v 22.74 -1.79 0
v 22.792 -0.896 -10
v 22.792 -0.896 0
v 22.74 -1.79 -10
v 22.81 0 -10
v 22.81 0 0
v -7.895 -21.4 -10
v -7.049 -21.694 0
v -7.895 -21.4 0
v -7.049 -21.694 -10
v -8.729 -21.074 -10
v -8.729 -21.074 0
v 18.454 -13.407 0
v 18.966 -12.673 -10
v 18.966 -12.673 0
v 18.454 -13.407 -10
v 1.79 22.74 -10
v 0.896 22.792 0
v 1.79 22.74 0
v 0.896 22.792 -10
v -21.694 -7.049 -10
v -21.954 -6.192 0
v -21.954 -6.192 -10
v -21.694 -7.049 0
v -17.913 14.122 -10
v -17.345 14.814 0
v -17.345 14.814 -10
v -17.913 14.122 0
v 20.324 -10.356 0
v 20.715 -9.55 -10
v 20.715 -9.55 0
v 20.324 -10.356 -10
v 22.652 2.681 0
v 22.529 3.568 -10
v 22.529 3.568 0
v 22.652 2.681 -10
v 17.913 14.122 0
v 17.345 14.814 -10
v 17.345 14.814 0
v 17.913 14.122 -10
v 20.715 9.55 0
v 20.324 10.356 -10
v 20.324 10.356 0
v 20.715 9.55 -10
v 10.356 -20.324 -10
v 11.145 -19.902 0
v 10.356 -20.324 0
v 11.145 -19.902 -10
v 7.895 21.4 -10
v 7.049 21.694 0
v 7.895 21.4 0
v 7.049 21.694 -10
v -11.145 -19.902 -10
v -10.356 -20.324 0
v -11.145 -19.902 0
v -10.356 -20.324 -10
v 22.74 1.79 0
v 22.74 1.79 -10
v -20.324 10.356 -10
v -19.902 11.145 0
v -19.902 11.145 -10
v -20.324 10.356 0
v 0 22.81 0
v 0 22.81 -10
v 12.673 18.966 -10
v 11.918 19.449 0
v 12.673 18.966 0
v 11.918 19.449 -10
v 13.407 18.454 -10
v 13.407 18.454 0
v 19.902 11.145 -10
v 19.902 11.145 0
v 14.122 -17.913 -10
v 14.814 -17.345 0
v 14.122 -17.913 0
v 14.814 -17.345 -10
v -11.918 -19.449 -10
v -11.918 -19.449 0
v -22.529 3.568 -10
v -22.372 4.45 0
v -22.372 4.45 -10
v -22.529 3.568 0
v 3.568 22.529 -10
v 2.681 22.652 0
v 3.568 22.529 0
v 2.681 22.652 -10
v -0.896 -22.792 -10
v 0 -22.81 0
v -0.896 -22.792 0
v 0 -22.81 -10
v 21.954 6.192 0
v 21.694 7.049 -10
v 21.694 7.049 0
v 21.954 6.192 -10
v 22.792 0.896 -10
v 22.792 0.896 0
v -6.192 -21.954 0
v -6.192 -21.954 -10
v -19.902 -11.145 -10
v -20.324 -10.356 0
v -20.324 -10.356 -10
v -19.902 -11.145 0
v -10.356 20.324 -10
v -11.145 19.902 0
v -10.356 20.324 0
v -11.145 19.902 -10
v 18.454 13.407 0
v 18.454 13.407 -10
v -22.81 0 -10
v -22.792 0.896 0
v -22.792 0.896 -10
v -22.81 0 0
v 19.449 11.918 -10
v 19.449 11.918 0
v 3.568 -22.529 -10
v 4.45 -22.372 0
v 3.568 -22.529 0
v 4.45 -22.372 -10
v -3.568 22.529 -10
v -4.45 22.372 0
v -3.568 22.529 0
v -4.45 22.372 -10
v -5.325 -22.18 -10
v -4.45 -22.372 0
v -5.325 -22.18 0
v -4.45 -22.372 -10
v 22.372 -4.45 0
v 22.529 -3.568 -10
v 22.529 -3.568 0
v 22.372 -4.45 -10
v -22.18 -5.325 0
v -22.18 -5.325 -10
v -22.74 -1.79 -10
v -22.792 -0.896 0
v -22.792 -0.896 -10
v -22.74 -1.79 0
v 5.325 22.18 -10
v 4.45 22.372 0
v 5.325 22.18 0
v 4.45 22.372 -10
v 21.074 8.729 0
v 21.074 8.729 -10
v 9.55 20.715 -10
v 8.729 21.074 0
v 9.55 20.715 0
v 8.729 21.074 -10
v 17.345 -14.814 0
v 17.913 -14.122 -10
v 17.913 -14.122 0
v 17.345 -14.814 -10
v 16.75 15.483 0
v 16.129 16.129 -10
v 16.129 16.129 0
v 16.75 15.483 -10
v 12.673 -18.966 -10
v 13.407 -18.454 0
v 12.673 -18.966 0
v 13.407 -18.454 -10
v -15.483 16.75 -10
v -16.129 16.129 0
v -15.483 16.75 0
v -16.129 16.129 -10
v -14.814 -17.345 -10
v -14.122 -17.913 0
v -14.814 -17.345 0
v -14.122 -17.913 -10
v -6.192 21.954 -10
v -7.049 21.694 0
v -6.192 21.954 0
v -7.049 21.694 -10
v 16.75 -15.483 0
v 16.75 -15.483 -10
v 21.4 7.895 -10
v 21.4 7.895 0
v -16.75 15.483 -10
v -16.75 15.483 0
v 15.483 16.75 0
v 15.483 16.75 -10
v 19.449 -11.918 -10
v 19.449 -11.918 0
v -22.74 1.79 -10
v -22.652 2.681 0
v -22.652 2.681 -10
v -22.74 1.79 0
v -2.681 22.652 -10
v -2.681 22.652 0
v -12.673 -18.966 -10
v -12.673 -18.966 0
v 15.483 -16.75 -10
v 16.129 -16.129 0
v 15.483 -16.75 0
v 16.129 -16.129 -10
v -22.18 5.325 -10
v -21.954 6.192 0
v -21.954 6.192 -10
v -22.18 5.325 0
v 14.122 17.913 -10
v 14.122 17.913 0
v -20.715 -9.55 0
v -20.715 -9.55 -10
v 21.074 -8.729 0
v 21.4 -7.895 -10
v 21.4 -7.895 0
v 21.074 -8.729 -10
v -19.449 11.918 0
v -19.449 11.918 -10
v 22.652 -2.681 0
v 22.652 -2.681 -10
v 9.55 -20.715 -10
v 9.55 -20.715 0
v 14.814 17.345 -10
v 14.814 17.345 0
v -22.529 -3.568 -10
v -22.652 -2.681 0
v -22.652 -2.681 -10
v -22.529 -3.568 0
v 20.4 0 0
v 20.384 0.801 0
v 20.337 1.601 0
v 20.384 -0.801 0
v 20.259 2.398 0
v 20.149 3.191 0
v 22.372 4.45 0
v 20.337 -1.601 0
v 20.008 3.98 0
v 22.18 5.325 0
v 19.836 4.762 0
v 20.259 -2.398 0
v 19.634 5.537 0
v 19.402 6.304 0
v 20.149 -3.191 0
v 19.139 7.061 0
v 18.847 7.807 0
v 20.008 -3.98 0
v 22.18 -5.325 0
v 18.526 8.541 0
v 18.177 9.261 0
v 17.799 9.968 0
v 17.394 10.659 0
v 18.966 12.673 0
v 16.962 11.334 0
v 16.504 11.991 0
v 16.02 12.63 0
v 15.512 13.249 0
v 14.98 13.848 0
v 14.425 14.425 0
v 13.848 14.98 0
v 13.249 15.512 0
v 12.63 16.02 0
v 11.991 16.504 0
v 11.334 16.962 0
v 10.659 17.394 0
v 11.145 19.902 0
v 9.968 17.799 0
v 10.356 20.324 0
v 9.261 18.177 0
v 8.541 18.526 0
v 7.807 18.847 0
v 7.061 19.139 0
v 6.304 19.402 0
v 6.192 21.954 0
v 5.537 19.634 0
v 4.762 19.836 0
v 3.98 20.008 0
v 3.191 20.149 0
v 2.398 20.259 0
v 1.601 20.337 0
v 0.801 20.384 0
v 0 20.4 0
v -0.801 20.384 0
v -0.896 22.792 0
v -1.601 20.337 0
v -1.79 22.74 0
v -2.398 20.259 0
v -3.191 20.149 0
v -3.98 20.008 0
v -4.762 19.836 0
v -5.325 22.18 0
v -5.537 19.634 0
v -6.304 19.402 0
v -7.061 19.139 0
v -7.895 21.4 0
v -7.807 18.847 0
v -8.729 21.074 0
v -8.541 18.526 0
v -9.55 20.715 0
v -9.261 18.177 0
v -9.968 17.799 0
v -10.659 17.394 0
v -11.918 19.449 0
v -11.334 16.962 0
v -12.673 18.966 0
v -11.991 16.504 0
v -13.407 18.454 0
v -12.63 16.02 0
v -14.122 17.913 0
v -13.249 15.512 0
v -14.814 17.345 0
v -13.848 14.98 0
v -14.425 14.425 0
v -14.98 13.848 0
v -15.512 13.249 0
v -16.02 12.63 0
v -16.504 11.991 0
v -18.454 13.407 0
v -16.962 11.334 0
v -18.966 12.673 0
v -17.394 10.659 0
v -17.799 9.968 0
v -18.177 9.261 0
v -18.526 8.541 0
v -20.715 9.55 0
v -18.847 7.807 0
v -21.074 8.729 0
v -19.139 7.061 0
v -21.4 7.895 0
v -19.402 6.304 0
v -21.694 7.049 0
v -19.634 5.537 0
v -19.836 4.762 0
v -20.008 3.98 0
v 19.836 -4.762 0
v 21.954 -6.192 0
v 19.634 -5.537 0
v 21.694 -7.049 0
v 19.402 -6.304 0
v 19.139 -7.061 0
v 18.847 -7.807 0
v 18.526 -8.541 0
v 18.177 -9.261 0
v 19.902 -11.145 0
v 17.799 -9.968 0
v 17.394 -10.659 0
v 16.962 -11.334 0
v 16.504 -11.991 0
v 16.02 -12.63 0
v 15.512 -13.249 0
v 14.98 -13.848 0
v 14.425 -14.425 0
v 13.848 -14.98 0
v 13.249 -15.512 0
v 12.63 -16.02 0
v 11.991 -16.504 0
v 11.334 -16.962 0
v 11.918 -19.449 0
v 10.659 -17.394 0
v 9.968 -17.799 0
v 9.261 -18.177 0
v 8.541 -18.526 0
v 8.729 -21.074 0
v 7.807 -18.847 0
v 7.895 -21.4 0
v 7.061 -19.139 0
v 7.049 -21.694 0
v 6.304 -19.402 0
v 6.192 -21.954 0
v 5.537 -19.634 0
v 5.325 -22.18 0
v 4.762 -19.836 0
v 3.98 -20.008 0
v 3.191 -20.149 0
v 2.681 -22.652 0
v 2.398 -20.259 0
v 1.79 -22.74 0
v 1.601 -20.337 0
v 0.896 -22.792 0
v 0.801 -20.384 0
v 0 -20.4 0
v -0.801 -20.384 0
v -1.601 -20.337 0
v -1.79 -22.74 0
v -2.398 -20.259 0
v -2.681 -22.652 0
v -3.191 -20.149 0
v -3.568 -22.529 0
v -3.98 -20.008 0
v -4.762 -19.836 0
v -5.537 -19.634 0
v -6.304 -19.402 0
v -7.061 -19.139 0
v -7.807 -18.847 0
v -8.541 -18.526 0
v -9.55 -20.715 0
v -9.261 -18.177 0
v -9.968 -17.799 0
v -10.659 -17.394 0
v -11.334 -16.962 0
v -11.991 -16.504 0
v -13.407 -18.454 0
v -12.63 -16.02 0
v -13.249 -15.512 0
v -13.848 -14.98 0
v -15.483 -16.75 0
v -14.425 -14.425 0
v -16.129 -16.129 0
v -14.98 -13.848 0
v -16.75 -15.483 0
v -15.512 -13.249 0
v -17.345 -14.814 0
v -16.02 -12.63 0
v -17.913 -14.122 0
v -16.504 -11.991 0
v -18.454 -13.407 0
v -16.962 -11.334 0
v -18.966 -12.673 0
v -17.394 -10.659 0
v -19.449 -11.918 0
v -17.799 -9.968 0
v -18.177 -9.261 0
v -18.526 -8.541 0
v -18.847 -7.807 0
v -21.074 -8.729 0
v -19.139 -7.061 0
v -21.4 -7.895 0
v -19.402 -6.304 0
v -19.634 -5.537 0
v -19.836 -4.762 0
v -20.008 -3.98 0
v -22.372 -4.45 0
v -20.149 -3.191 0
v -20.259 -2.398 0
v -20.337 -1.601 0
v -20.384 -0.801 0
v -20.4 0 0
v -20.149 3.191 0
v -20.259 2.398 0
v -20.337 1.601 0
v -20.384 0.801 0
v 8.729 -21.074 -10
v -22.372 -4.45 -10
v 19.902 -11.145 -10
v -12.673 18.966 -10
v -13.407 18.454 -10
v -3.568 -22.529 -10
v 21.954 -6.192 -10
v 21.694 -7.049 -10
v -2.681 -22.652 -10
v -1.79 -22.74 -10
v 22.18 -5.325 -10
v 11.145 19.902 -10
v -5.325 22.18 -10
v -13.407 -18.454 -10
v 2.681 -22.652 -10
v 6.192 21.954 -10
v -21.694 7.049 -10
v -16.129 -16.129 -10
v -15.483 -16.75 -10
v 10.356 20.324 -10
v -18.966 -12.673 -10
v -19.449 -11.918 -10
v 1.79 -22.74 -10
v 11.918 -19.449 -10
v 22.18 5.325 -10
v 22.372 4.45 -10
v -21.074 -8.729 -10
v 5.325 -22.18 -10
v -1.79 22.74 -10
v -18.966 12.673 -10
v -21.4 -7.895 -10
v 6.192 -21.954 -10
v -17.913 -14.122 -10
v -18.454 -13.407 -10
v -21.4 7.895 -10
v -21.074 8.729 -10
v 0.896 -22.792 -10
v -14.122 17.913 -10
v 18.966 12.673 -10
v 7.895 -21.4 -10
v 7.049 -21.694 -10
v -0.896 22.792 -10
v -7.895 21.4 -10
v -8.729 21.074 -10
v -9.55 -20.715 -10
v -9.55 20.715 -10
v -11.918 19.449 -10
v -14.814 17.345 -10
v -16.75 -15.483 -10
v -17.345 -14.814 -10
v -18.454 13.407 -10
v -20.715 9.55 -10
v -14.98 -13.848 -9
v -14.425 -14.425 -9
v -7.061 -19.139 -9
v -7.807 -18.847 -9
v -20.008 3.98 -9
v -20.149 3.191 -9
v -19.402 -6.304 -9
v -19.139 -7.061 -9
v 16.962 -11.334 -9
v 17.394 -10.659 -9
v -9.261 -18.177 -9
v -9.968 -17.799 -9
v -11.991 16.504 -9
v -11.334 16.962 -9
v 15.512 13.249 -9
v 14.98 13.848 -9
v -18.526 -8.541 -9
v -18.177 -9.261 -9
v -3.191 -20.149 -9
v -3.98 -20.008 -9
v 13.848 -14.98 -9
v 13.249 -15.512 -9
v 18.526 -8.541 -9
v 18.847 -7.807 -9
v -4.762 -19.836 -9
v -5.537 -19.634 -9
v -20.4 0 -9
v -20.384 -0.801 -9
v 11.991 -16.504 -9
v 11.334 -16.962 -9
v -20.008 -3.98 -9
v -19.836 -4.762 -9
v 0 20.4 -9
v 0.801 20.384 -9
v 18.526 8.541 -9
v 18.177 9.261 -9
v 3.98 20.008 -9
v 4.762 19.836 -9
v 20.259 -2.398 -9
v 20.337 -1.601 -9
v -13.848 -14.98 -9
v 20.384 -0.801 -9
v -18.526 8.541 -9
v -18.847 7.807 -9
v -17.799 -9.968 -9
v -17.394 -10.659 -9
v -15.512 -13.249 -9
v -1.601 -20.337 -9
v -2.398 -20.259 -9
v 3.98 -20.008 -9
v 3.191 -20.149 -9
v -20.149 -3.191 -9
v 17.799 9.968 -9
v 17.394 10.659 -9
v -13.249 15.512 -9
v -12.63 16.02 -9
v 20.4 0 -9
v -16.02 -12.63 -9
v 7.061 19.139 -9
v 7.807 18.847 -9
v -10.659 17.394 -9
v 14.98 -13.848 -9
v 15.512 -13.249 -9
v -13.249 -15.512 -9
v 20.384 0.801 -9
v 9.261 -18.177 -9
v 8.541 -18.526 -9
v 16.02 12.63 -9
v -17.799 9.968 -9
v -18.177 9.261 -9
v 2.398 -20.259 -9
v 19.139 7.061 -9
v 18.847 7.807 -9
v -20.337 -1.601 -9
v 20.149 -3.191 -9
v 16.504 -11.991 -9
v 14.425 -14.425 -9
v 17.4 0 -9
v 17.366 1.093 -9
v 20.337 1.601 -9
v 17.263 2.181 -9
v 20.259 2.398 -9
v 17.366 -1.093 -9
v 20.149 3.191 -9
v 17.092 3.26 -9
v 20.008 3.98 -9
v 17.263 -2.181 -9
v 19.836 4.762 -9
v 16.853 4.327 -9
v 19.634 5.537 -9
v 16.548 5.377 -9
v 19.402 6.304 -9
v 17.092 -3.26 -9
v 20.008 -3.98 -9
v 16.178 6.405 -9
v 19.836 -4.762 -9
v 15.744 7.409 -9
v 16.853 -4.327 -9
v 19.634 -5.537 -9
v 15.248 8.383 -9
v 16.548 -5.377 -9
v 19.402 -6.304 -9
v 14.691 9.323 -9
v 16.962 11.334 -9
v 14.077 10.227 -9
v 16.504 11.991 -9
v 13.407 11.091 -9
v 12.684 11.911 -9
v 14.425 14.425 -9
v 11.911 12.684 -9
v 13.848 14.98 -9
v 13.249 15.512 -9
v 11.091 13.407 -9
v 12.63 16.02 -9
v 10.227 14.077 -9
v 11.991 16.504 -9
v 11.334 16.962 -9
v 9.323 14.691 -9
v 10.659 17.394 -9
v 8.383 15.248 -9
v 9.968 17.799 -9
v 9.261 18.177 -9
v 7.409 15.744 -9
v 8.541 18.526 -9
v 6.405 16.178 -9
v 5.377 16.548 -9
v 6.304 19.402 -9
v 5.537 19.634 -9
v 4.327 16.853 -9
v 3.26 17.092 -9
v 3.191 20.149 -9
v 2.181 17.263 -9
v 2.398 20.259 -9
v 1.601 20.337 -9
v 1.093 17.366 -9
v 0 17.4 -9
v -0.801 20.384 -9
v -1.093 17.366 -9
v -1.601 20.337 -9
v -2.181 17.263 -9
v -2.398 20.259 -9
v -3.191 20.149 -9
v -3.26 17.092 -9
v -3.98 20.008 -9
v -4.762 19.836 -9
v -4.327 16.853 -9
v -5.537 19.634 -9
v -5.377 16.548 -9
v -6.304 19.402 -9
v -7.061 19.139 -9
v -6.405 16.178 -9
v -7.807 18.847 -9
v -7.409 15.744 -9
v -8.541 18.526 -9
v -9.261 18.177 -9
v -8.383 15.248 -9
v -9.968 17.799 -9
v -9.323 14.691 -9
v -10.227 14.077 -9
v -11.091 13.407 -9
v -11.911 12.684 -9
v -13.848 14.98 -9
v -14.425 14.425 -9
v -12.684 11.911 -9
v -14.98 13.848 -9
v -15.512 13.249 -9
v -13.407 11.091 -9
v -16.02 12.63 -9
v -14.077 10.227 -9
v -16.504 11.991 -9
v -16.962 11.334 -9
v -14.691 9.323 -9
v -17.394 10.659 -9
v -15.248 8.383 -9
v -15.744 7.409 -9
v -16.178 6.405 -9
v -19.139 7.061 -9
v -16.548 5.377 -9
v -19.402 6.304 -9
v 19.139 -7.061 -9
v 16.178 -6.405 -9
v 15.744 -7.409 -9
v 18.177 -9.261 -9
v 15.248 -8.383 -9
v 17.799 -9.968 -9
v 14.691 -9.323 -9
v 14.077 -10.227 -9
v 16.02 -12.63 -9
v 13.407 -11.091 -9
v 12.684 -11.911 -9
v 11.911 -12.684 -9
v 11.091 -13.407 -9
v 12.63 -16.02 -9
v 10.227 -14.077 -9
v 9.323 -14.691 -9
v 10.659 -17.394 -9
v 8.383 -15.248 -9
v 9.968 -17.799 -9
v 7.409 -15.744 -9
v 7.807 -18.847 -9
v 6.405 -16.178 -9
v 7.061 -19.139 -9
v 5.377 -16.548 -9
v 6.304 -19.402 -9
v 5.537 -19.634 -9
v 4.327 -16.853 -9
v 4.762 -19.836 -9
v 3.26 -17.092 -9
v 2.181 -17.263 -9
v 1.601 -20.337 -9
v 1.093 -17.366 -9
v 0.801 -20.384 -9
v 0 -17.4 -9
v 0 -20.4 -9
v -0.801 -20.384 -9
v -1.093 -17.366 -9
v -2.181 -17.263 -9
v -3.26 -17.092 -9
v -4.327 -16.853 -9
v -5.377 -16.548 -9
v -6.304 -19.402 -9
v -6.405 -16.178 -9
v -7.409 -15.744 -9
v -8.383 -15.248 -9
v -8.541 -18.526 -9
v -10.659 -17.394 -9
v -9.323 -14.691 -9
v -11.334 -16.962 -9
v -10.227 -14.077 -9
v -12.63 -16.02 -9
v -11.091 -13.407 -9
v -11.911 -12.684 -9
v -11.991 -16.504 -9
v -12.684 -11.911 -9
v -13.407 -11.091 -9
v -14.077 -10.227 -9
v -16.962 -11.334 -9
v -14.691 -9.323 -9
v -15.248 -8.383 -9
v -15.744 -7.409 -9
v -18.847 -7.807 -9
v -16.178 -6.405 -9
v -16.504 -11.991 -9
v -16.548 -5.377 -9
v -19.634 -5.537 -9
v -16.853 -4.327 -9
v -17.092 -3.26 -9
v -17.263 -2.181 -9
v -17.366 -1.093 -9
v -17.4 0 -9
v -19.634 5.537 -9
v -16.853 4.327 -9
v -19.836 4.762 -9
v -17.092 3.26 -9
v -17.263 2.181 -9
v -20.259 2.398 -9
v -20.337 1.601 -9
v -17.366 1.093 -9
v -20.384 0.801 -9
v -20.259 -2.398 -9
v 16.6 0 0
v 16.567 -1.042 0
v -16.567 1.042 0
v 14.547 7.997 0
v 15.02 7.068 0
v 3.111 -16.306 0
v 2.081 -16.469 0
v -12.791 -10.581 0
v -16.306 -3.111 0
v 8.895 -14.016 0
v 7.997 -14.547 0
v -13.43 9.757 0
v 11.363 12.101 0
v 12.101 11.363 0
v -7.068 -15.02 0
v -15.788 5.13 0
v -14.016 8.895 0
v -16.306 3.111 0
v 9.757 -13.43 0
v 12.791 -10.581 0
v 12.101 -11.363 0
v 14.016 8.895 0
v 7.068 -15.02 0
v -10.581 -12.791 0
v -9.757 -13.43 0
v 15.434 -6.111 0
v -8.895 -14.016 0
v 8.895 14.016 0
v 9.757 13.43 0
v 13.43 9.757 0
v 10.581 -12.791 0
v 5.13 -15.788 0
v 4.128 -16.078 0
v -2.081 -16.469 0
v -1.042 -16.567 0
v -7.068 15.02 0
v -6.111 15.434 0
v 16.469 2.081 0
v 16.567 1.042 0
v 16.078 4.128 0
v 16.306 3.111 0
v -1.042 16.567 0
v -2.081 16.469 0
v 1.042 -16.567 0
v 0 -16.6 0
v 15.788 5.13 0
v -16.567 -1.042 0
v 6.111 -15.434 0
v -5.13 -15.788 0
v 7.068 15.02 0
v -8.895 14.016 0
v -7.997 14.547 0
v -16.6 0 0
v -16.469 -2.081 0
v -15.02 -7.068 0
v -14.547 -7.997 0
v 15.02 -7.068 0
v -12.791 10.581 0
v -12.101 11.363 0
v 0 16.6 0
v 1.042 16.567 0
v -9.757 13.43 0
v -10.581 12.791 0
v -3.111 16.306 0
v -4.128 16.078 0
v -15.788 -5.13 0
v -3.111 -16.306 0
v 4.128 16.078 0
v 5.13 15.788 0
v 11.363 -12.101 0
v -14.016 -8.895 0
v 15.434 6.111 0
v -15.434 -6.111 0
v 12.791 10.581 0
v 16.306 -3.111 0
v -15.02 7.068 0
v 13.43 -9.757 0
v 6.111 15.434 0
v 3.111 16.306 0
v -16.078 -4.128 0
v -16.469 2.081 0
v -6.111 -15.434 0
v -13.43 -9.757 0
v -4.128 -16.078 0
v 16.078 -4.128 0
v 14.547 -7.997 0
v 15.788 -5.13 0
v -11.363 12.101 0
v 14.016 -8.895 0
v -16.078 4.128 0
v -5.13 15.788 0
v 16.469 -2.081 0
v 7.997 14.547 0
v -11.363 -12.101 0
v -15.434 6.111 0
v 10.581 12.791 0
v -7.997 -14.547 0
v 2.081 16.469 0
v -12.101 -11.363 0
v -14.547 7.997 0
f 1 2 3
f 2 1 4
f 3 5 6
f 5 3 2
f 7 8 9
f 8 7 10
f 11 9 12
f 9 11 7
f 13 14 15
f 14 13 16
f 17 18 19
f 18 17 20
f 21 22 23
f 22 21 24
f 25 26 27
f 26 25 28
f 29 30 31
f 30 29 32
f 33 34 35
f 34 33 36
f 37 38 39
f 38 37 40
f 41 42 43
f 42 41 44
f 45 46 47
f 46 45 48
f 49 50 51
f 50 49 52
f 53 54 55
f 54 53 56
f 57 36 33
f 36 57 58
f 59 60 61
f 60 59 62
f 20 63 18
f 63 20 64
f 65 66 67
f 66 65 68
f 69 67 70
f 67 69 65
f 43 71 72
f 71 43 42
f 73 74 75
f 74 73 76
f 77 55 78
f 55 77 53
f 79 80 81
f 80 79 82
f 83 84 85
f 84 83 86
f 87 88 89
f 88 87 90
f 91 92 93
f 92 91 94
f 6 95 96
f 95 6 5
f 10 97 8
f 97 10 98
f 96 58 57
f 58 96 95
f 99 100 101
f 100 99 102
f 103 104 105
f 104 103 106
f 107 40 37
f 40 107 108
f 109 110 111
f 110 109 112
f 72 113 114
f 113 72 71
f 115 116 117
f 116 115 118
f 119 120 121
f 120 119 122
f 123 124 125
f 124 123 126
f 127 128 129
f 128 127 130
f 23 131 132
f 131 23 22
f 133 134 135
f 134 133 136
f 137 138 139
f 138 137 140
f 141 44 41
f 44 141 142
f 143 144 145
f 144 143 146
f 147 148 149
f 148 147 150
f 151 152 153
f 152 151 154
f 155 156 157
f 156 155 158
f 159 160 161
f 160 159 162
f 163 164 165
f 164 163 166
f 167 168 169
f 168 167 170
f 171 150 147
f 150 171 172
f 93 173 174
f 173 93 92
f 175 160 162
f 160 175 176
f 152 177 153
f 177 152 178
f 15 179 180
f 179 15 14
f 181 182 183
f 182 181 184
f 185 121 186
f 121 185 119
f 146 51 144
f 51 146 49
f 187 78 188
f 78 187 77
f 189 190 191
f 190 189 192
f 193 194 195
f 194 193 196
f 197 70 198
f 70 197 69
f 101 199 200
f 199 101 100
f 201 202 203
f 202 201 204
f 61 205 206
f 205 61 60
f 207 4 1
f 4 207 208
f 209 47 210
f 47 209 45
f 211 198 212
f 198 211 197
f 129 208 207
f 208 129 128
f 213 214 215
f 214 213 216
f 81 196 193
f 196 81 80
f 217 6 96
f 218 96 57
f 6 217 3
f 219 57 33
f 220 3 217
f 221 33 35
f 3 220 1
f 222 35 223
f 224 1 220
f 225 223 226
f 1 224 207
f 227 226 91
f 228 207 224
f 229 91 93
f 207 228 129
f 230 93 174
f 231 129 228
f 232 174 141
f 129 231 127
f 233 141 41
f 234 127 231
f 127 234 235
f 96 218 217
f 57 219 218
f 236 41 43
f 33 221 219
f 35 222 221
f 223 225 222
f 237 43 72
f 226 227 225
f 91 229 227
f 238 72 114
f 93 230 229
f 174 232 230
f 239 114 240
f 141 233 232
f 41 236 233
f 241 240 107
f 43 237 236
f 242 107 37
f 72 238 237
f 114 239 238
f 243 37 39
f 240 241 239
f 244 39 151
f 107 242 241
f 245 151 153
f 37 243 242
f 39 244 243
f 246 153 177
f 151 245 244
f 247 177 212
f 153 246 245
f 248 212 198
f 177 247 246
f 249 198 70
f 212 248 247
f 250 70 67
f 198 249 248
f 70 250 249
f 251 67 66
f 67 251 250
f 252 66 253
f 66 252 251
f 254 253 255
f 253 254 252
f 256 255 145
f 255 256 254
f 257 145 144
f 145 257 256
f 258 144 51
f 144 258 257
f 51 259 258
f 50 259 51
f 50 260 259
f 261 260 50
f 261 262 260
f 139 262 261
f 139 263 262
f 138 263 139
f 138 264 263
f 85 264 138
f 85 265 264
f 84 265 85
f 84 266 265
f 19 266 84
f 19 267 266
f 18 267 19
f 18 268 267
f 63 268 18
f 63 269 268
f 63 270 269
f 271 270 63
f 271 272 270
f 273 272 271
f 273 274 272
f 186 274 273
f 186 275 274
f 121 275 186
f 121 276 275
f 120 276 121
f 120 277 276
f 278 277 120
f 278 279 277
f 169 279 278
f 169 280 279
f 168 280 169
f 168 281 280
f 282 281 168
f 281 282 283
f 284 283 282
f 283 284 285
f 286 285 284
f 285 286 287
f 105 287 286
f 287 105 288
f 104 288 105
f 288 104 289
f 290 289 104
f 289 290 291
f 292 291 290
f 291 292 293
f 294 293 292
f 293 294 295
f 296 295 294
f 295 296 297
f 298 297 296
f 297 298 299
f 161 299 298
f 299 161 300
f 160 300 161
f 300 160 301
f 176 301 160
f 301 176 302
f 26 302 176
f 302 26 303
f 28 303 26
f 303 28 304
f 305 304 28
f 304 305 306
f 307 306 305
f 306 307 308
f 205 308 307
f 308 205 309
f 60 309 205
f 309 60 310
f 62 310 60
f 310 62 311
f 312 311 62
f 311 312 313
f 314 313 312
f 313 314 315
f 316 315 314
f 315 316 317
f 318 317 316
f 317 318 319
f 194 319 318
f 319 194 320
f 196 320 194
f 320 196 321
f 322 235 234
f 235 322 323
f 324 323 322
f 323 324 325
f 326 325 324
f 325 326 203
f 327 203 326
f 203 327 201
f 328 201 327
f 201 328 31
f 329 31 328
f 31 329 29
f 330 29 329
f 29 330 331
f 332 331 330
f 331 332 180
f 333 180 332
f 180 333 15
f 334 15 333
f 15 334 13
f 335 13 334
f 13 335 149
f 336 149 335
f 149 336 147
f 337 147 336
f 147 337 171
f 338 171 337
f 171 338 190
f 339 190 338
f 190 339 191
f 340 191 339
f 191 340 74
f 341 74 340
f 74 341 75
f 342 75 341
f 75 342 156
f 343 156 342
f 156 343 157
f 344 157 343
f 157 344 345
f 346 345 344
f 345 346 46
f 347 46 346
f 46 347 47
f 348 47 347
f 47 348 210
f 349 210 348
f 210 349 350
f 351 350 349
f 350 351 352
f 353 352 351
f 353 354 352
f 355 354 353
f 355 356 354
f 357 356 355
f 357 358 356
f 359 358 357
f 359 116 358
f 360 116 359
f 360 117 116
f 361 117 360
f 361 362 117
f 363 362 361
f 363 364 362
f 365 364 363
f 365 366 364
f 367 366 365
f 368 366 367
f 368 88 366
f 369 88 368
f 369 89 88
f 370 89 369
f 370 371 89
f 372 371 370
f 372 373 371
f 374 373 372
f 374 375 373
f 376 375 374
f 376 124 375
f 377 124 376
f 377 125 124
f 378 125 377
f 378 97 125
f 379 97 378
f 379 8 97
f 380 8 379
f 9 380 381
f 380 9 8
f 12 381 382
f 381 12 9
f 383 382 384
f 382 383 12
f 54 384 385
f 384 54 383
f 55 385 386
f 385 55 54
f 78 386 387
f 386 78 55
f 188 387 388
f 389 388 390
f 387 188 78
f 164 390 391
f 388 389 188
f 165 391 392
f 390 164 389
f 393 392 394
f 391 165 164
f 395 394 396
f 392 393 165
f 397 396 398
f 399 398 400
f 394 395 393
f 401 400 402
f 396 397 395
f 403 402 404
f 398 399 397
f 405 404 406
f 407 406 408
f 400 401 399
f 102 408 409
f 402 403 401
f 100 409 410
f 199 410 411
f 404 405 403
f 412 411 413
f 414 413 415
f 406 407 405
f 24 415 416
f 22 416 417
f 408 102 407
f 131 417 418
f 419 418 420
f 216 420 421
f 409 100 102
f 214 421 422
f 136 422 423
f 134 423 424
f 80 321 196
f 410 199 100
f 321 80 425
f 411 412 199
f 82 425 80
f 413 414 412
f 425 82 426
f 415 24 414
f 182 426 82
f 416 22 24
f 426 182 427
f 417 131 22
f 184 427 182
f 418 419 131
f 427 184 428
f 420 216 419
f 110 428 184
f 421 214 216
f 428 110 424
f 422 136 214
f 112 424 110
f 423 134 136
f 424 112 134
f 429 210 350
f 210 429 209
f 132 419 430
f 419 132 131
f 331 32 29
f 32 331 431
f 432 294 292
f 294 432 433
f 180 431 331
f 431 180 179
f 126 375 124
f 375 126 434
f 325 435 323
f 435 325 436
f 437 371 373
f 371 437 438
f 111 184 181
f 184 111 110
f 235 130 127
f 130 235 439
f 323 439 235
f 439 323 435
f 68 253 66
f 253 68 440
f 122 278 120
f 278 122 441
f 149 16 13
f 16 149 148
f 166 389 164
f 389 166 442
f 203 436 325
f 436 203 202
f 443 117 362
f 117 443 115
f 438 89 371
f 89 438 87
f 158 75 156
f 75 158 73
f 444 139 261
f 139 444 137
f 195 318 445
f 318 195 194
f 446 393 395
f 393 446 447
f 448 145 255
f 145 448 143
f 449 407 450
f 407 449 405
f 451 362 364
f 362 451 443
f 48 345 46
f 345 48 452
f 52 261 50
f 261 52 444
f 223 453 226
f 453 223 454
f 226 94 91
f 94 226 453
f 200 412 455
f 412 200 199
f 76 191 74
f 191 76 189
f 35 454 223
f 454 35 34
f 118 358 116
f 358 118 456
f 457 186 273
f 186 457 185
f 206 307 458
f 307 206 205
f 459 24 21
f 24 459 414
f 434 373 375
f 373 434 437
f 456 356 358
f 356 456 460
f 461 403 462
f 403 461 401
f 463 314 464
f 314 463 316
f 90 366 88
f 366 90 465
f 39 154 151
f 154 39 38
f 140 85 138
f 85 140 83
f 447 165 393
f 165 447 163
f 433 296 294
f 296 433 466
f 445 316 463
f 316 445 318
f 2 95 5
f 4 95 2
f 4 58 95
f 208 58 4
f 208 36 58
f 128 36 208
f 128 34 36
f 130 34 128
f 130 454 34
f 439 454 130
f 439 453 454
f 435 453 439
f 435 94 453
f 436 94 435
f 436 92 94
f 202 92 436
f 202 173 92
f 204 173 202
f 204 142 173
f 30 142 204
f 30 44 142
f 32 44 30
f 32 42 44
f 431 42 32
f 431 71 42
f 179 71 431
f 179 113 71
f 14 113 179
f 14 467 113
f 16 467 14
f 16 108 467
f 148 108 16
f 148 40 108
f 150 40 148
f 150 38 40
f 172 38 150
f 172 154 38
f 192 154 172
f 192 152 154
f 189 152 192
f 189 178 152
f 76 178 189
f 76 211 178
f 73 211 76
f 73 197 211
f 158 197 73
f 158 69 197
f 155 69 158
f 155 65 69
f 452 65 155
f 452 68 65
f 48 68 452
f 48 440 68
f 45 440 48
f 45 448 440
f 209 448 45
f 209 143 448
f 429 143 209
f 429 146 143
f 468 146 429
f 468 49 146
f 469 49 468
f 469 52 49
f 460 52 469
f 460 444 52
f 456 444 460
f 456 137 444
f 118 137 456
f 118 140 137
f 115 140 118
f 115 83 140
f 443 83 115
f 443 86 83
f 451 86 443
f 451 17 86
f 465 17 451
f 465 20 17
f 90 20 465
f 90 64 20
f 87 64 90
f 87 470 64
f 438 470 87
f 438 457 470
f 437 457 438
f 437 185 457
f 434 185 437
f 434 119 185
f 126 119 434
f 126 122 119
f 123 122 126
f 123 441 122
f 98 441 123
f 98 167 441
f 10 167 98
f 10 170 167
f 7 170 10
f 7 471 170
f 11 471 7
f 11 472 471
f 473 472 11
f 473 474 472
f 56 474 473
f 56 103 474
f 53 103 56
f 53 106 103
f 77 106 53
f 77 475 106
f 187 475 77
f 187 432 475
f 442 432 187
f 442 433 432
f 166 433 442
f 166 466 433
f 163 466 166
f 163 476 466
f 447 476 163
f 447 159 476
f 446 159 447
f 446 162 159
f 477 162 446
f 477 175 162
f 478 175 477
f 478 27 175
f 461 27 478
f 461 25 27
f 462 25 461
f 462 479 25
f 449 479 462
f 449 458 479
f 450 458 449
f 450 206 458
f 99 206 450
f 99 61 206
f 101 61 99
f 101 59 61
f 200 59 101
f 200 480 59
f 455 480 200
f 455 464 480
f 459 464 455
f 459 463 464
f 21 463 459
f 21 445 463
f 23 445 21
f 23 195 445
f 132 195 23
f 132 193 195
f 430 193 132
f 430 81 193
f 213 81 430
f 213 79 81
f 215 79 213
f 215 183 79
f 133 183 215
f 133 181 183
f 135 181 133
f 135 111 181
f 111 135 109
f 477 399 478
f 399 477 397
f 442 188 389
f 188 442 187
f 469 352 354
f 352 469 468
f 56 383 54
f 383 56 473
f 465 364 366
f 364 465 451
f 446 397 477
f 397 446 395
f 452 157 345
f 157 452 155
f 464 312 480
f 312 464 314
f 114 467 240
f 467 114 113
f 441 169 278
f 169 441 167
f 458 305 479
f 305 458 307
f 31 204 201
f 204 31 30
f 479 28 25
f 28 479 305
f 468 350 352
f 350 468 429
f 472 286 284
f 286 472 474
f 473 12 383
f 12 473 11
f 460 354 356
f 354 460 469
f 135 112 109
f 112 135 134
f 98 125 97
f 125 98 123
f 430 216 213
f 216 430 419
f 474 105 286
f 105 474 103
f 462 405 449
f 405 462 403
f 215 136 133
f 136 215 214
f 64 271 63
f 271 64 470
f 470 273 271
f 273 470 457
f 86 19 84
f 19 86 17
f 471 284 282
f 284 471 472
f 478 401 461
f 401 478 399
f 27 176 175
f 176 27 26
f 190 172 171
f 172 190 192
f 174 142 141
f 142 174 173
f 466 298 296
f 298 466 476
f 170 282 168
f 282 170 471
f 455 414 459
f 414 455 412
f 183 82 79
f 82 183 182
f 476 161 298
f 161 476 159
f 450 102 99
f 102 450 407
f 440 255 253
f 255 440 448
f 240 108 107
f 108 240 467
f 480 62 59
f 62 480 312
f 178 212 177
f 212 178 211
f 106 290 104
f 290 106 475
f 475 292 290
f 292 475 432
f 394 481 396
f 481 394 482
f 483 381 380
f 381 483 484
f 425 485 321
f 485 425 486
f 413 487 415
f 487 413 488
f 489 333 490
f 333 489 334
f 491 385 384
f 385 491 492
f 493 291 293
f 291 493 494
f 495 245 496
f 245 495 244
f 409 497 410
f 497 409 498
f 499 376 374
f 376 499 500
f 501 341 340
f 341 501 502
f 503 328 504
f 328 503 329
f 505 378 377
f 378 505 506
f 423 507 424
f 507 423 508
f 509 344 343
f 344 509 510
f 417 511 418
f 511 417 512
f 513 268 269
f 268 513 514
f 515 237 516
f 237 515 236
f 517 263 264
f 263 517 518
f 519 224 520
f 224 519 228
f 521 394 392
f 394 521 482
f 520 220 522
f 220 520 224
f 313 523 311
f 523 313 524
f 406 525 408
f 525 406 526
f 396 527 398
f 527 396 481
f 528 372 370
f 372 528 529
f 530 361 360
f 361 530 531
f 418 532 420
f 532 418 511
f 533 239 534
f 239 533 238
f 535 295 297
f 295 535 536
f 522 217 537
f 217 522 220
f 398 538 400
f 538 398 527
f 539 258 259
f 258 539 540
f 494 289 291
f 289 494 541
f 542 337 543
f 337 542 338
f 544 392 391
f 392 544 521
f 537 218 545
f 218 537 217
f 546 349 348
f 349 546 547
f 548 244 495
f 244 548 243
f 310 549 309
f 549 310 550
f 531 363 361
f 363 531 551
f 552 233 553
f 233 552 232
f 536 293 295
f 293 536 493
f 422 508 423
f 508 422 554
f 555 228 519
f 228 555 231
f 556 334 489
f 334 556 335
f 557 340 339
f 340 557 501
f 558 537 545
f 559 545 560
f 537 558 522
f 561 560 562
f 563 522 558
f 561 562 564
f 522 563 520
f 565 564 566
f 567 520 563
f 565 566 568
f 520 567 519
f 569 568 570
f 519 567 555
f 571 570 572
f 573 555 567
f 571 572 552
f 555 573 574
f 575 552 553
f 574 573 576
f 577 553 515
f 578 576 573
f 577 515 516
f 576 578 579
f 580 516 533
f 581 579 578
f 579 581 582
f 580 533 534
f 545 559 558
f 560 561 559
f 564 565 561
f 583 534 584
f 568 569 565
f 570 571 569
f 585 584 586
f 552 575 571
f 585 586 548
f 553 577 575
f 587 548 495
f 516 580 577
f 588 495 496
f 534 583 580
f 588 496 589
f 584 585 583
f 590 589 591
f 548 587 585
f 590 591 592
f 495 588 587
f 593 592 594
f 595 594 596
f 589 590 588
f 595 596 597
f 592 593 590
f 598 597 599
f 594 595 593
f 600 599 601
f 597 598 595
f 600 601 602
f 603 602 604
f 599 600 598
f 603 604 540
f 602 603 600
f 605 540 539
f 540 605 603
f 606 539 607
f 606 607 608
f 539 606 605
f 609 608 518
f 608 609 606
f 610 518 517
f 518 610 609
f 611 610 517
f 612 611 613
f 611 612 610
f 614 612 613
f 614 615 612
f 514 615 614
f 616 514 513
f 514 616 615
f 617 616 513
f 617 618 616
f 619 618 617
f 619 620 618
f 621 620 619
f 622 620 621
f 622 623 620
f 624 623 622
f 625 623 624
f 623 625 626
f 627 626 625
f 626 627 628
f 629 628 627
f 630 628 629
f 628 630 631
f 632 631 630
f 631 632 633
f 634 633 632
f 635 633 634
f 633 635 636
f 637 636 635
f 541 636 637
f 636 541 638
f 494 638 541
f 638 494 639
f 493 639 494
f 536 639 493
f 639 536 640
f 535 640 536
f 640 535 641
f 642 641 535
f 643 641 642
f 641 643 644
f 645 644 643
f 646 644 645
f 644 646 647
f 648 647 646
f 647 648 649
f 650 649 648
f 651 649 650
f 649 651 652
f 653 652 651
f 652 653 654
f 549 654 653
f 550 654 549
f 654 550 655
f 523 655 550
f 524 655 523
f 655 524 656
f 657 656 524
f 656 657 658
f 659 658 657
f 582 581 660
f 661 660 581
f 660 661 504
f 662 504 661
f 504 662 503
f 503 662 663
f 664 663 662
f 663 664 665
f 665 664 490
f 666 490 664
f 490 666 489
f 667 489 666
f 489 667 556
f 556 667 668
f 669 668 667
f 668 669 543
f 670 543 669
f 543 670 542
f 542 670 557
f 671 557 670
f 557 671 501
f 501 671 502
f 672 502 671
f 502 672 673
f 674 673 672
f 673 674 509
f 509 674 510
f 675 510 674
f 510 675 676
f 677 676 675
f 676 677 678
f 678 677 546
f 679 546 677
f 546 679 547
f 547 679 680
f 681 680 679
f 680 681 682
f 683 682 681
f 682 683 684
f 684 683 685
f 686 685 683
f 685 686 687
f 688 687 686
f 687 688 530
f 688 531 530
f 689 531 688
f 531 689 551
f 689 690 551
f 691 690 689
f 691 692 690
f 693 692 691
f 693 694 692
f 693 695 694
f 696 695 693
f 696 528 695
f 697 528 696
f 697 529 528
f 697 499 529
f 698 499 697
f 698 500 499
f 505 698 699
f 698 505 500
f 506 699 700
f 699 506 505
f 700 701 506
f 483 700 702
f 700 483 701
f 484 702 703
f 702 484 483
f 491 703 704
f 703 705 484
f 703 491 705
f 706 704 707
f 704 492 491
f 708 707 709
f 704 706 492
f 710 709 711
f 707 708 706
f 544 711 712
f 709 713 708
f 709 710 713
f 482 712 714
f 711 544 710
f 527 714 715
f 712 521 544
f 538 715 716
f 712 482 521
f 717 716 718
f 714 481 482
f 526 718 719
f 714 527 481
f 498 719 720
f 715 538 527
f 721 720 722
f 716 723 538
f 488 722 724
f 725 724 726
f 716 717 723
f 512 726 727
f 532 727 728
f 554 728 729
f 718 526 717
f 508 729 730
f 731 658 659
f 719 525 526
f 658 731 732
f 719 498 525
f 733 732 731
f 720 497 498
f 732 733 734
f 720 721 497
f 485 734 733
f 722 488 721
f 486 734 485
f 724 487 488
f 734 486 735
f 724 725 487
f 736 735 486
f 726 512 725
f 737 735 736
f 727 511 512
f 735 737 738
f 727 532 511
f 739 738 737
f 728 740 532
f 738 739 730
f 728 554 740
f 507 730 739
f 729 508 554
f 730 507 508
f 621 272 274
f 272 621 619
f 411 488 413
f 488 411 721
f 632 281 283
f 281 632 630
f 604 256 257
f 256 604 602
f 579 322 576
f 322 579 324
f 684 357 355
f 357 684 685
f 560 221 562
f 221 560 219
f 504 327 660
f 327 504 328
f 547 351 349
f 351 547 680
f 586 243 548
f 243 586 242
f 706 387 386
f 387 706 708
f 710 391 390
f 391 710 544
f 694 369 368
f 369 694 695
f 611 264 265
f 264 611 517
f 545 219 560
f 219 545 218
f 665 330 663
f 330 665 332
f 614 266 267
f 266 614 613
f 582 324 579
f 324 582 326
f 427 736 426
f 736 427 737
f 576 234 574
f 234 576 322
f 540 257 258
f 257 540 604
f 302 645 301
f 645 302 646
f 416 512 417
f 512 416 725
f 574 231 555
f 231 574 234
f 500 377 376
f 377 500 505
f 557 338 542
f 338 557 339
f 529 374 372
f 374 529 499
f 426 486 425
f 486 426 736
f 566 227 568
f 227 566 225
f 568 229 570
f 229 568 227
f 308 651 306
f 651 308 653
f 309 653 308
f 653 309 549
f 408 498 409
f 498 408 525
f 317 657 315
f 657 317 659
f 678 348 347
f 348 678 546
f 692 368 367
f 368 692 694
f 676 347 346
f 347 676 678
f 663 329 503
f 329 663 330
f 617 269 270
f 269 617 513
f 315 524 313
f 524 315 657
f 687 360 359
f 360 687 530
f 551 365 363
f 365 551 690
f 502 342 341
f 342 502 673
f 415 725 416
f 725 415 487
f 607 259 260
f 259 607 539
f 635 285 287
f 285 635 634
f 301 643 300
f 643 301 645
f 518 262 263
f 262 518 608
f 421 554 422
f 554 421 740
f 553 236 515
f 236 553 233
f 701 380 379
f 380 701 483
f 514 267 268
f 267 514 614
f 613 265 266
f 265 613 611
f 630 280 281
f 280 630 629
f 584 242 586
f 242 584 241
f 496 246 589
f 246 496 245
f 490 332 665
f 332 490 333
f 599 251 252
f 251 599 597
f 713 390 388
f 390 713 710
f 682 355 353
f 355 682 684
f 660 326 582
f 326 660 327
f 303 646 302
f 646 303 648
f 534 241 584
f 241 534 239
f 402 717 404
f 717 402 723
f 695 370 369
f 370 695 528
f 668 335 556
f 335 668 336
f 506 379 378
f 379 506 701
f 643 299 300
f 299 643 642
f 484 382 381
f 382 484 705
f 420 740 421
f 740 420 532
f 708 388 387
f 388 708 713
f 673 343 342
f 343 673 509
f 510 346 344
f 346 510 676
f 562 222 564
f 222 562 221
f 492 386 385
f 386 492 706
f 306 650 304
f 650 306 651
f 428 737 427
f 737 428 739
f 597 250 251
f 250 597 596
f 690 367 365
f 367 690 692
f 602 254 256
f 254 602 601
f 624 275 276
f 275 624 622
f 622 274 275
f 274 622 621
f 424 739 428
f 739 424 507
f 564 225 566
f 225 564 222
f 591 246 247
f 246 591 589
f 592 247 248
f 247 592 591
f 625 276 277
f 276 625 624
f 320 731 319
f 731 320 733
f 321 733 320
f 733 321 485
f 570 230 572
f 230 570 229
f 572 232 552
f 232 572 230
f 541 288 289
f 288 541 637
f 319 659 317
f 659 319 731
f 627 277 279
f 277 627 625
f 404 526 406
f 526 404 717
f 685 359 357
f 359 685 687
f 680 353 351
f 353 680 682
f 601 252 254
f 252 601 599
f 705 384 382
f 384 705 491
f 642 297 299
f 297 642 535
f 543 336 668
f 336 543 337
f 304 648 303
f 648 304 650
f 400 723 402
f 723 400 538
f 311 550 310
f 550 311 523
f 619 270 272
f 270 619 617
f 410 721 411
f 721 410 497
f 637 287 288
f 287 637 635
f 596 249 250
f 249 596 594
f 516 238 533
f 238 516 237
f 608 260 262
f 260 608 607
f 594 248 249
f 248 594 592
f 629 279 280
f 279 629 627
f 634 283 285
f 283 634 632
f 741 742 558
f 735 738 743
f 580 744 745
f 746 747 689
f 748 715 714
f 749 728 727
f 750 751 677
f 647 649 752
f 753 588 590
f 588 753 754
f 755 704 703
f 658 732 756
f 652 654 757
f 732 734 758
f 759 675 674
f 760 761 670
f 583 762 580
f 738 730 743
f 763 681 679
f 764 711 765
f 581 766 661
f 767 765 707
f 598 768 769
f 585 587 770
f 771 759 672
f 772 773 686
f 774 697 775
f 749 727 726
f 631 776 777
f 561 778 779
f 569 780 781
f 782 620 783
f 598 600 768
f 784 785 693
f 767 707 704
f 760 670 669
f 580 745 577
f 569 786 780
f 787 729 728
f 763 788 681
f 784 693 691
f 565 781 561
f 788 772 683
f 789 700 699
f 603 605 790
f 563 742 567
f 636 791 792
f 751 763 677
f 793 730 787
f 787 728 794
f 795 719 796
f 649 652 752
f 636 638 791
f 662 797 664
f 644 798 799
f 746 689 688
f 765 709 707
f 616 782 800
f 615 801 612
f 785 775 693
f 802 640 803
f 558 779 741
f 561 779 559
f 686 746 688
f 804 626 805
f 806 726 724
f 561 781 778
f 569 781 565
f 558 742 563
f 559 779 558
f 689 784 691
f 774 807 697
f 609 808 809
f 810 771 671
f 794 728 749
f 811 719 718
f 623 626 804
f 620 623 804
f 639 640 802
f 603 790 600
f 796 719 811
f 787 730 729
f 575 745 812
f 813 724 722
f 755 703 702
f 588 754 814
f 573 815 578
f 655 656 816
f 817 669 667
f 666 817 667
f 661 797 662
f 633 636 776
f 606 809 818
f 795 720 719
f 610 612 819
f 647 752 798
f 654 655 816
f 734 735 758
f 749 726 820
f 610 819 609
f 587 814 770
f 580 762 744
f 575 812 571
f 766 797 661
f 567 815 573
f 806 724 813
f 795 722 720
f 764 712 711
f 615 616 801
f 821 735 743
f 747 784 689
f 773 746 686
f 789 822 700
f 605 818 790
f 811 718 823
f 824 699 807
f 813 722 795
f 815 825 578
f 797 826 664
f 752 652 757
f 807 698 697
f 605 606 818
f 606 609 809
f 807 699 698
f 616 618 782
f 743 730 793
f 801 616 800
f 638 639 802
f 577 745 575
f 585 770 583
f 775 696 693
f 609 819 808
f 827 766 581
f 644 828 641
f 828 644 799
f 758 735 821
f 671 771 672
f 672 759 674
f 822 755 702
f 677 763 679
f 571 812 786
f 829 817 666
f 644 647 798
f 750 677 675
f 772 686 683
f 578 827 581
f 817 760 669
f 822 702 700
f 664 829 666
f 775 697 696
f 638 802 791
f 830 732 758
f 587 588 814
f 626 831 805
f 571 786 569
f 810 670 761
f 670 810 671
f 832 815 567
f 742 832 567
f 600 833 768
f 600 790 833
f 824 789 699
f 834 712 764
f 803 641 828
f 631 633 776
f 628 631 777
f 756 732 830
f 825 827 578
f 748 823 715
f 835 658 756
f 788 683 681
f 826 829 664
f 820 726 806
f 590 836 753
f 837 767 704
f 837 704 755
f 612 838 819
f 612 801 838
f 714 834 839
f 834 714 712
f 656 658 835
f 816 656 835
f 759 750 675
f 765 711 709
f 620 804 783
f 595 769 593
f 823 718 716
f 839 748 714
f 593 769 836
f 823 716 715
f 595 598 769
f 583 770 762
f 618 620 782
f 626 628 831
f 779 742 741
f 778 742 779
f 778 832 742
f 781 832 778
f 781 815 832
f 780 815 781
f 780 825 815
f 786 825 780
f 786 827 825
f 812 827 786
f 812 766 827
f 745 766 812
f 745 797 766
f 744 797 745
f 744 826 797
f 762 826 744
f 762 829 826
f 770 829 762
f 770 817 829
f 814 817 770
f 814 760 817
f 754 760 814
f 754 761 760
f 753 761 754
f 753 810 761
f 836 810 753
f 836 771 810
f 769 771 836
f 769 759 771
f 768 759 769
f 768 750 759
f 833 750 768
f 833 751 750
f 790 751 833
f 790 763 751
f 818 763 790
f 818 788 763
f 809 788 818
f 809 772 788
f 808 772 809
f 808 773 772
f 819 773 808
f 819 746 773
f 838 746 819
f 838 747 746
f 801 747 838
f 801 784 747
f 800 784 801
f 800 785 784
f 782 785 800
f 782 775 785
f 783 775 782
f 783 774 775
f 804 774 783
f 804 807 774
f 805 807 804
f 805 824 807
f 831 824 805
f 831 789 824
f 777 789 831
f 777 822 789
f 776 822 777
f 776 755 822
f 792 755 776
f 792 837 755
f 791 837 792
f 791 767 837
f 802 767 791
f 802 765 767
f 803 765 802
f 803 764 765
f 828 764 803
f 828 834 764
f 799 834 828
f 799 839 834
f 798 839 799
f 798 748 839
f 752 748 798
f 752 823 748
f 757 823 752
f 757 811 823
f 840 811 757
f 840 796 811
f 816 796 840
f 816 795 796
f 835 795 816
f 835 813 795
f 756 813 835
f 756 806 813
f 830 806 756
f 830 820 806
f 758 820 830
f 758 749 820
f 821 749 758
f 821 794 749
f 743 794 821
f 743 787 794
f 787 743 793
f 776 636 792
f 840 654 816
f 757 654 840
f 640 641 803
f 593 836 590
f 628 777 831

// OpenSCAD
//Written by Remi Vansnickt
//Feel free to tip me : https://www.thingiverse.com/Remivans/about
//Thingiverse : https://www.thingiverse.com/thing:3149090
//Licensed under the Creative Commons - Attribution - Non-Commercial - Share Alike license.

/* [PVC TUBE] */
//( mm ) Outer diameter of pvc pipe
pvcOuterDiameter=40;//[8:0.5:200]

//( mm ) Inner diameter of pvc pipe
pvcInnerDiameter=34;//[4:0.5:190]

//( mm ) Clearance beetween part and outer pvc pipe
pvcpartClearance=0.4;//[0.1:0.05:1]

//Wall's number determine Thickness PrinterNozzleWidth*WallLayerCount 0.4*3=1.2mm
PvcWallLayerCount=6;  //[1:1:10]

//(mm) Thickness of bottom floor
floorWidth=1;//[1:01:10]

//( mm ) length mount on pvc tube
pvcLength=10;//[5:1:100]

/* [printerSetting] */
//( mm ) Width of the Nozzle
PrinterNozzleWidth=0.4; //[0.1:0.05:1]


pvcT=PvcWallLayerCount*PrinterNozzleWidth+0.01;

module tube(){
difference(){
     translate([0,0,0])
        cylinder(r=pvcOuterDiameter/2+pvcpartClearance+pvcT,h=pvcLength,$fn=4*pvcOuterDiameter);

 translate([0,0,-floorWidth])
        cylinder(r=pvcOuterDiameter/2+pvcpartClearance,h=pvcLength,$fn=4*pvcOuterDiameter);
    }

cylinder($fn = 100, $fa = 12, $fs = 100, h = pvcLength-floorWidth, r1 = pvcInnerDiameter/2-pvcpartClearance, r2 = pvcInnerDiameter/2+pvcpartClearance, center = false);
}rotate(180,[1,0,0])tube();
